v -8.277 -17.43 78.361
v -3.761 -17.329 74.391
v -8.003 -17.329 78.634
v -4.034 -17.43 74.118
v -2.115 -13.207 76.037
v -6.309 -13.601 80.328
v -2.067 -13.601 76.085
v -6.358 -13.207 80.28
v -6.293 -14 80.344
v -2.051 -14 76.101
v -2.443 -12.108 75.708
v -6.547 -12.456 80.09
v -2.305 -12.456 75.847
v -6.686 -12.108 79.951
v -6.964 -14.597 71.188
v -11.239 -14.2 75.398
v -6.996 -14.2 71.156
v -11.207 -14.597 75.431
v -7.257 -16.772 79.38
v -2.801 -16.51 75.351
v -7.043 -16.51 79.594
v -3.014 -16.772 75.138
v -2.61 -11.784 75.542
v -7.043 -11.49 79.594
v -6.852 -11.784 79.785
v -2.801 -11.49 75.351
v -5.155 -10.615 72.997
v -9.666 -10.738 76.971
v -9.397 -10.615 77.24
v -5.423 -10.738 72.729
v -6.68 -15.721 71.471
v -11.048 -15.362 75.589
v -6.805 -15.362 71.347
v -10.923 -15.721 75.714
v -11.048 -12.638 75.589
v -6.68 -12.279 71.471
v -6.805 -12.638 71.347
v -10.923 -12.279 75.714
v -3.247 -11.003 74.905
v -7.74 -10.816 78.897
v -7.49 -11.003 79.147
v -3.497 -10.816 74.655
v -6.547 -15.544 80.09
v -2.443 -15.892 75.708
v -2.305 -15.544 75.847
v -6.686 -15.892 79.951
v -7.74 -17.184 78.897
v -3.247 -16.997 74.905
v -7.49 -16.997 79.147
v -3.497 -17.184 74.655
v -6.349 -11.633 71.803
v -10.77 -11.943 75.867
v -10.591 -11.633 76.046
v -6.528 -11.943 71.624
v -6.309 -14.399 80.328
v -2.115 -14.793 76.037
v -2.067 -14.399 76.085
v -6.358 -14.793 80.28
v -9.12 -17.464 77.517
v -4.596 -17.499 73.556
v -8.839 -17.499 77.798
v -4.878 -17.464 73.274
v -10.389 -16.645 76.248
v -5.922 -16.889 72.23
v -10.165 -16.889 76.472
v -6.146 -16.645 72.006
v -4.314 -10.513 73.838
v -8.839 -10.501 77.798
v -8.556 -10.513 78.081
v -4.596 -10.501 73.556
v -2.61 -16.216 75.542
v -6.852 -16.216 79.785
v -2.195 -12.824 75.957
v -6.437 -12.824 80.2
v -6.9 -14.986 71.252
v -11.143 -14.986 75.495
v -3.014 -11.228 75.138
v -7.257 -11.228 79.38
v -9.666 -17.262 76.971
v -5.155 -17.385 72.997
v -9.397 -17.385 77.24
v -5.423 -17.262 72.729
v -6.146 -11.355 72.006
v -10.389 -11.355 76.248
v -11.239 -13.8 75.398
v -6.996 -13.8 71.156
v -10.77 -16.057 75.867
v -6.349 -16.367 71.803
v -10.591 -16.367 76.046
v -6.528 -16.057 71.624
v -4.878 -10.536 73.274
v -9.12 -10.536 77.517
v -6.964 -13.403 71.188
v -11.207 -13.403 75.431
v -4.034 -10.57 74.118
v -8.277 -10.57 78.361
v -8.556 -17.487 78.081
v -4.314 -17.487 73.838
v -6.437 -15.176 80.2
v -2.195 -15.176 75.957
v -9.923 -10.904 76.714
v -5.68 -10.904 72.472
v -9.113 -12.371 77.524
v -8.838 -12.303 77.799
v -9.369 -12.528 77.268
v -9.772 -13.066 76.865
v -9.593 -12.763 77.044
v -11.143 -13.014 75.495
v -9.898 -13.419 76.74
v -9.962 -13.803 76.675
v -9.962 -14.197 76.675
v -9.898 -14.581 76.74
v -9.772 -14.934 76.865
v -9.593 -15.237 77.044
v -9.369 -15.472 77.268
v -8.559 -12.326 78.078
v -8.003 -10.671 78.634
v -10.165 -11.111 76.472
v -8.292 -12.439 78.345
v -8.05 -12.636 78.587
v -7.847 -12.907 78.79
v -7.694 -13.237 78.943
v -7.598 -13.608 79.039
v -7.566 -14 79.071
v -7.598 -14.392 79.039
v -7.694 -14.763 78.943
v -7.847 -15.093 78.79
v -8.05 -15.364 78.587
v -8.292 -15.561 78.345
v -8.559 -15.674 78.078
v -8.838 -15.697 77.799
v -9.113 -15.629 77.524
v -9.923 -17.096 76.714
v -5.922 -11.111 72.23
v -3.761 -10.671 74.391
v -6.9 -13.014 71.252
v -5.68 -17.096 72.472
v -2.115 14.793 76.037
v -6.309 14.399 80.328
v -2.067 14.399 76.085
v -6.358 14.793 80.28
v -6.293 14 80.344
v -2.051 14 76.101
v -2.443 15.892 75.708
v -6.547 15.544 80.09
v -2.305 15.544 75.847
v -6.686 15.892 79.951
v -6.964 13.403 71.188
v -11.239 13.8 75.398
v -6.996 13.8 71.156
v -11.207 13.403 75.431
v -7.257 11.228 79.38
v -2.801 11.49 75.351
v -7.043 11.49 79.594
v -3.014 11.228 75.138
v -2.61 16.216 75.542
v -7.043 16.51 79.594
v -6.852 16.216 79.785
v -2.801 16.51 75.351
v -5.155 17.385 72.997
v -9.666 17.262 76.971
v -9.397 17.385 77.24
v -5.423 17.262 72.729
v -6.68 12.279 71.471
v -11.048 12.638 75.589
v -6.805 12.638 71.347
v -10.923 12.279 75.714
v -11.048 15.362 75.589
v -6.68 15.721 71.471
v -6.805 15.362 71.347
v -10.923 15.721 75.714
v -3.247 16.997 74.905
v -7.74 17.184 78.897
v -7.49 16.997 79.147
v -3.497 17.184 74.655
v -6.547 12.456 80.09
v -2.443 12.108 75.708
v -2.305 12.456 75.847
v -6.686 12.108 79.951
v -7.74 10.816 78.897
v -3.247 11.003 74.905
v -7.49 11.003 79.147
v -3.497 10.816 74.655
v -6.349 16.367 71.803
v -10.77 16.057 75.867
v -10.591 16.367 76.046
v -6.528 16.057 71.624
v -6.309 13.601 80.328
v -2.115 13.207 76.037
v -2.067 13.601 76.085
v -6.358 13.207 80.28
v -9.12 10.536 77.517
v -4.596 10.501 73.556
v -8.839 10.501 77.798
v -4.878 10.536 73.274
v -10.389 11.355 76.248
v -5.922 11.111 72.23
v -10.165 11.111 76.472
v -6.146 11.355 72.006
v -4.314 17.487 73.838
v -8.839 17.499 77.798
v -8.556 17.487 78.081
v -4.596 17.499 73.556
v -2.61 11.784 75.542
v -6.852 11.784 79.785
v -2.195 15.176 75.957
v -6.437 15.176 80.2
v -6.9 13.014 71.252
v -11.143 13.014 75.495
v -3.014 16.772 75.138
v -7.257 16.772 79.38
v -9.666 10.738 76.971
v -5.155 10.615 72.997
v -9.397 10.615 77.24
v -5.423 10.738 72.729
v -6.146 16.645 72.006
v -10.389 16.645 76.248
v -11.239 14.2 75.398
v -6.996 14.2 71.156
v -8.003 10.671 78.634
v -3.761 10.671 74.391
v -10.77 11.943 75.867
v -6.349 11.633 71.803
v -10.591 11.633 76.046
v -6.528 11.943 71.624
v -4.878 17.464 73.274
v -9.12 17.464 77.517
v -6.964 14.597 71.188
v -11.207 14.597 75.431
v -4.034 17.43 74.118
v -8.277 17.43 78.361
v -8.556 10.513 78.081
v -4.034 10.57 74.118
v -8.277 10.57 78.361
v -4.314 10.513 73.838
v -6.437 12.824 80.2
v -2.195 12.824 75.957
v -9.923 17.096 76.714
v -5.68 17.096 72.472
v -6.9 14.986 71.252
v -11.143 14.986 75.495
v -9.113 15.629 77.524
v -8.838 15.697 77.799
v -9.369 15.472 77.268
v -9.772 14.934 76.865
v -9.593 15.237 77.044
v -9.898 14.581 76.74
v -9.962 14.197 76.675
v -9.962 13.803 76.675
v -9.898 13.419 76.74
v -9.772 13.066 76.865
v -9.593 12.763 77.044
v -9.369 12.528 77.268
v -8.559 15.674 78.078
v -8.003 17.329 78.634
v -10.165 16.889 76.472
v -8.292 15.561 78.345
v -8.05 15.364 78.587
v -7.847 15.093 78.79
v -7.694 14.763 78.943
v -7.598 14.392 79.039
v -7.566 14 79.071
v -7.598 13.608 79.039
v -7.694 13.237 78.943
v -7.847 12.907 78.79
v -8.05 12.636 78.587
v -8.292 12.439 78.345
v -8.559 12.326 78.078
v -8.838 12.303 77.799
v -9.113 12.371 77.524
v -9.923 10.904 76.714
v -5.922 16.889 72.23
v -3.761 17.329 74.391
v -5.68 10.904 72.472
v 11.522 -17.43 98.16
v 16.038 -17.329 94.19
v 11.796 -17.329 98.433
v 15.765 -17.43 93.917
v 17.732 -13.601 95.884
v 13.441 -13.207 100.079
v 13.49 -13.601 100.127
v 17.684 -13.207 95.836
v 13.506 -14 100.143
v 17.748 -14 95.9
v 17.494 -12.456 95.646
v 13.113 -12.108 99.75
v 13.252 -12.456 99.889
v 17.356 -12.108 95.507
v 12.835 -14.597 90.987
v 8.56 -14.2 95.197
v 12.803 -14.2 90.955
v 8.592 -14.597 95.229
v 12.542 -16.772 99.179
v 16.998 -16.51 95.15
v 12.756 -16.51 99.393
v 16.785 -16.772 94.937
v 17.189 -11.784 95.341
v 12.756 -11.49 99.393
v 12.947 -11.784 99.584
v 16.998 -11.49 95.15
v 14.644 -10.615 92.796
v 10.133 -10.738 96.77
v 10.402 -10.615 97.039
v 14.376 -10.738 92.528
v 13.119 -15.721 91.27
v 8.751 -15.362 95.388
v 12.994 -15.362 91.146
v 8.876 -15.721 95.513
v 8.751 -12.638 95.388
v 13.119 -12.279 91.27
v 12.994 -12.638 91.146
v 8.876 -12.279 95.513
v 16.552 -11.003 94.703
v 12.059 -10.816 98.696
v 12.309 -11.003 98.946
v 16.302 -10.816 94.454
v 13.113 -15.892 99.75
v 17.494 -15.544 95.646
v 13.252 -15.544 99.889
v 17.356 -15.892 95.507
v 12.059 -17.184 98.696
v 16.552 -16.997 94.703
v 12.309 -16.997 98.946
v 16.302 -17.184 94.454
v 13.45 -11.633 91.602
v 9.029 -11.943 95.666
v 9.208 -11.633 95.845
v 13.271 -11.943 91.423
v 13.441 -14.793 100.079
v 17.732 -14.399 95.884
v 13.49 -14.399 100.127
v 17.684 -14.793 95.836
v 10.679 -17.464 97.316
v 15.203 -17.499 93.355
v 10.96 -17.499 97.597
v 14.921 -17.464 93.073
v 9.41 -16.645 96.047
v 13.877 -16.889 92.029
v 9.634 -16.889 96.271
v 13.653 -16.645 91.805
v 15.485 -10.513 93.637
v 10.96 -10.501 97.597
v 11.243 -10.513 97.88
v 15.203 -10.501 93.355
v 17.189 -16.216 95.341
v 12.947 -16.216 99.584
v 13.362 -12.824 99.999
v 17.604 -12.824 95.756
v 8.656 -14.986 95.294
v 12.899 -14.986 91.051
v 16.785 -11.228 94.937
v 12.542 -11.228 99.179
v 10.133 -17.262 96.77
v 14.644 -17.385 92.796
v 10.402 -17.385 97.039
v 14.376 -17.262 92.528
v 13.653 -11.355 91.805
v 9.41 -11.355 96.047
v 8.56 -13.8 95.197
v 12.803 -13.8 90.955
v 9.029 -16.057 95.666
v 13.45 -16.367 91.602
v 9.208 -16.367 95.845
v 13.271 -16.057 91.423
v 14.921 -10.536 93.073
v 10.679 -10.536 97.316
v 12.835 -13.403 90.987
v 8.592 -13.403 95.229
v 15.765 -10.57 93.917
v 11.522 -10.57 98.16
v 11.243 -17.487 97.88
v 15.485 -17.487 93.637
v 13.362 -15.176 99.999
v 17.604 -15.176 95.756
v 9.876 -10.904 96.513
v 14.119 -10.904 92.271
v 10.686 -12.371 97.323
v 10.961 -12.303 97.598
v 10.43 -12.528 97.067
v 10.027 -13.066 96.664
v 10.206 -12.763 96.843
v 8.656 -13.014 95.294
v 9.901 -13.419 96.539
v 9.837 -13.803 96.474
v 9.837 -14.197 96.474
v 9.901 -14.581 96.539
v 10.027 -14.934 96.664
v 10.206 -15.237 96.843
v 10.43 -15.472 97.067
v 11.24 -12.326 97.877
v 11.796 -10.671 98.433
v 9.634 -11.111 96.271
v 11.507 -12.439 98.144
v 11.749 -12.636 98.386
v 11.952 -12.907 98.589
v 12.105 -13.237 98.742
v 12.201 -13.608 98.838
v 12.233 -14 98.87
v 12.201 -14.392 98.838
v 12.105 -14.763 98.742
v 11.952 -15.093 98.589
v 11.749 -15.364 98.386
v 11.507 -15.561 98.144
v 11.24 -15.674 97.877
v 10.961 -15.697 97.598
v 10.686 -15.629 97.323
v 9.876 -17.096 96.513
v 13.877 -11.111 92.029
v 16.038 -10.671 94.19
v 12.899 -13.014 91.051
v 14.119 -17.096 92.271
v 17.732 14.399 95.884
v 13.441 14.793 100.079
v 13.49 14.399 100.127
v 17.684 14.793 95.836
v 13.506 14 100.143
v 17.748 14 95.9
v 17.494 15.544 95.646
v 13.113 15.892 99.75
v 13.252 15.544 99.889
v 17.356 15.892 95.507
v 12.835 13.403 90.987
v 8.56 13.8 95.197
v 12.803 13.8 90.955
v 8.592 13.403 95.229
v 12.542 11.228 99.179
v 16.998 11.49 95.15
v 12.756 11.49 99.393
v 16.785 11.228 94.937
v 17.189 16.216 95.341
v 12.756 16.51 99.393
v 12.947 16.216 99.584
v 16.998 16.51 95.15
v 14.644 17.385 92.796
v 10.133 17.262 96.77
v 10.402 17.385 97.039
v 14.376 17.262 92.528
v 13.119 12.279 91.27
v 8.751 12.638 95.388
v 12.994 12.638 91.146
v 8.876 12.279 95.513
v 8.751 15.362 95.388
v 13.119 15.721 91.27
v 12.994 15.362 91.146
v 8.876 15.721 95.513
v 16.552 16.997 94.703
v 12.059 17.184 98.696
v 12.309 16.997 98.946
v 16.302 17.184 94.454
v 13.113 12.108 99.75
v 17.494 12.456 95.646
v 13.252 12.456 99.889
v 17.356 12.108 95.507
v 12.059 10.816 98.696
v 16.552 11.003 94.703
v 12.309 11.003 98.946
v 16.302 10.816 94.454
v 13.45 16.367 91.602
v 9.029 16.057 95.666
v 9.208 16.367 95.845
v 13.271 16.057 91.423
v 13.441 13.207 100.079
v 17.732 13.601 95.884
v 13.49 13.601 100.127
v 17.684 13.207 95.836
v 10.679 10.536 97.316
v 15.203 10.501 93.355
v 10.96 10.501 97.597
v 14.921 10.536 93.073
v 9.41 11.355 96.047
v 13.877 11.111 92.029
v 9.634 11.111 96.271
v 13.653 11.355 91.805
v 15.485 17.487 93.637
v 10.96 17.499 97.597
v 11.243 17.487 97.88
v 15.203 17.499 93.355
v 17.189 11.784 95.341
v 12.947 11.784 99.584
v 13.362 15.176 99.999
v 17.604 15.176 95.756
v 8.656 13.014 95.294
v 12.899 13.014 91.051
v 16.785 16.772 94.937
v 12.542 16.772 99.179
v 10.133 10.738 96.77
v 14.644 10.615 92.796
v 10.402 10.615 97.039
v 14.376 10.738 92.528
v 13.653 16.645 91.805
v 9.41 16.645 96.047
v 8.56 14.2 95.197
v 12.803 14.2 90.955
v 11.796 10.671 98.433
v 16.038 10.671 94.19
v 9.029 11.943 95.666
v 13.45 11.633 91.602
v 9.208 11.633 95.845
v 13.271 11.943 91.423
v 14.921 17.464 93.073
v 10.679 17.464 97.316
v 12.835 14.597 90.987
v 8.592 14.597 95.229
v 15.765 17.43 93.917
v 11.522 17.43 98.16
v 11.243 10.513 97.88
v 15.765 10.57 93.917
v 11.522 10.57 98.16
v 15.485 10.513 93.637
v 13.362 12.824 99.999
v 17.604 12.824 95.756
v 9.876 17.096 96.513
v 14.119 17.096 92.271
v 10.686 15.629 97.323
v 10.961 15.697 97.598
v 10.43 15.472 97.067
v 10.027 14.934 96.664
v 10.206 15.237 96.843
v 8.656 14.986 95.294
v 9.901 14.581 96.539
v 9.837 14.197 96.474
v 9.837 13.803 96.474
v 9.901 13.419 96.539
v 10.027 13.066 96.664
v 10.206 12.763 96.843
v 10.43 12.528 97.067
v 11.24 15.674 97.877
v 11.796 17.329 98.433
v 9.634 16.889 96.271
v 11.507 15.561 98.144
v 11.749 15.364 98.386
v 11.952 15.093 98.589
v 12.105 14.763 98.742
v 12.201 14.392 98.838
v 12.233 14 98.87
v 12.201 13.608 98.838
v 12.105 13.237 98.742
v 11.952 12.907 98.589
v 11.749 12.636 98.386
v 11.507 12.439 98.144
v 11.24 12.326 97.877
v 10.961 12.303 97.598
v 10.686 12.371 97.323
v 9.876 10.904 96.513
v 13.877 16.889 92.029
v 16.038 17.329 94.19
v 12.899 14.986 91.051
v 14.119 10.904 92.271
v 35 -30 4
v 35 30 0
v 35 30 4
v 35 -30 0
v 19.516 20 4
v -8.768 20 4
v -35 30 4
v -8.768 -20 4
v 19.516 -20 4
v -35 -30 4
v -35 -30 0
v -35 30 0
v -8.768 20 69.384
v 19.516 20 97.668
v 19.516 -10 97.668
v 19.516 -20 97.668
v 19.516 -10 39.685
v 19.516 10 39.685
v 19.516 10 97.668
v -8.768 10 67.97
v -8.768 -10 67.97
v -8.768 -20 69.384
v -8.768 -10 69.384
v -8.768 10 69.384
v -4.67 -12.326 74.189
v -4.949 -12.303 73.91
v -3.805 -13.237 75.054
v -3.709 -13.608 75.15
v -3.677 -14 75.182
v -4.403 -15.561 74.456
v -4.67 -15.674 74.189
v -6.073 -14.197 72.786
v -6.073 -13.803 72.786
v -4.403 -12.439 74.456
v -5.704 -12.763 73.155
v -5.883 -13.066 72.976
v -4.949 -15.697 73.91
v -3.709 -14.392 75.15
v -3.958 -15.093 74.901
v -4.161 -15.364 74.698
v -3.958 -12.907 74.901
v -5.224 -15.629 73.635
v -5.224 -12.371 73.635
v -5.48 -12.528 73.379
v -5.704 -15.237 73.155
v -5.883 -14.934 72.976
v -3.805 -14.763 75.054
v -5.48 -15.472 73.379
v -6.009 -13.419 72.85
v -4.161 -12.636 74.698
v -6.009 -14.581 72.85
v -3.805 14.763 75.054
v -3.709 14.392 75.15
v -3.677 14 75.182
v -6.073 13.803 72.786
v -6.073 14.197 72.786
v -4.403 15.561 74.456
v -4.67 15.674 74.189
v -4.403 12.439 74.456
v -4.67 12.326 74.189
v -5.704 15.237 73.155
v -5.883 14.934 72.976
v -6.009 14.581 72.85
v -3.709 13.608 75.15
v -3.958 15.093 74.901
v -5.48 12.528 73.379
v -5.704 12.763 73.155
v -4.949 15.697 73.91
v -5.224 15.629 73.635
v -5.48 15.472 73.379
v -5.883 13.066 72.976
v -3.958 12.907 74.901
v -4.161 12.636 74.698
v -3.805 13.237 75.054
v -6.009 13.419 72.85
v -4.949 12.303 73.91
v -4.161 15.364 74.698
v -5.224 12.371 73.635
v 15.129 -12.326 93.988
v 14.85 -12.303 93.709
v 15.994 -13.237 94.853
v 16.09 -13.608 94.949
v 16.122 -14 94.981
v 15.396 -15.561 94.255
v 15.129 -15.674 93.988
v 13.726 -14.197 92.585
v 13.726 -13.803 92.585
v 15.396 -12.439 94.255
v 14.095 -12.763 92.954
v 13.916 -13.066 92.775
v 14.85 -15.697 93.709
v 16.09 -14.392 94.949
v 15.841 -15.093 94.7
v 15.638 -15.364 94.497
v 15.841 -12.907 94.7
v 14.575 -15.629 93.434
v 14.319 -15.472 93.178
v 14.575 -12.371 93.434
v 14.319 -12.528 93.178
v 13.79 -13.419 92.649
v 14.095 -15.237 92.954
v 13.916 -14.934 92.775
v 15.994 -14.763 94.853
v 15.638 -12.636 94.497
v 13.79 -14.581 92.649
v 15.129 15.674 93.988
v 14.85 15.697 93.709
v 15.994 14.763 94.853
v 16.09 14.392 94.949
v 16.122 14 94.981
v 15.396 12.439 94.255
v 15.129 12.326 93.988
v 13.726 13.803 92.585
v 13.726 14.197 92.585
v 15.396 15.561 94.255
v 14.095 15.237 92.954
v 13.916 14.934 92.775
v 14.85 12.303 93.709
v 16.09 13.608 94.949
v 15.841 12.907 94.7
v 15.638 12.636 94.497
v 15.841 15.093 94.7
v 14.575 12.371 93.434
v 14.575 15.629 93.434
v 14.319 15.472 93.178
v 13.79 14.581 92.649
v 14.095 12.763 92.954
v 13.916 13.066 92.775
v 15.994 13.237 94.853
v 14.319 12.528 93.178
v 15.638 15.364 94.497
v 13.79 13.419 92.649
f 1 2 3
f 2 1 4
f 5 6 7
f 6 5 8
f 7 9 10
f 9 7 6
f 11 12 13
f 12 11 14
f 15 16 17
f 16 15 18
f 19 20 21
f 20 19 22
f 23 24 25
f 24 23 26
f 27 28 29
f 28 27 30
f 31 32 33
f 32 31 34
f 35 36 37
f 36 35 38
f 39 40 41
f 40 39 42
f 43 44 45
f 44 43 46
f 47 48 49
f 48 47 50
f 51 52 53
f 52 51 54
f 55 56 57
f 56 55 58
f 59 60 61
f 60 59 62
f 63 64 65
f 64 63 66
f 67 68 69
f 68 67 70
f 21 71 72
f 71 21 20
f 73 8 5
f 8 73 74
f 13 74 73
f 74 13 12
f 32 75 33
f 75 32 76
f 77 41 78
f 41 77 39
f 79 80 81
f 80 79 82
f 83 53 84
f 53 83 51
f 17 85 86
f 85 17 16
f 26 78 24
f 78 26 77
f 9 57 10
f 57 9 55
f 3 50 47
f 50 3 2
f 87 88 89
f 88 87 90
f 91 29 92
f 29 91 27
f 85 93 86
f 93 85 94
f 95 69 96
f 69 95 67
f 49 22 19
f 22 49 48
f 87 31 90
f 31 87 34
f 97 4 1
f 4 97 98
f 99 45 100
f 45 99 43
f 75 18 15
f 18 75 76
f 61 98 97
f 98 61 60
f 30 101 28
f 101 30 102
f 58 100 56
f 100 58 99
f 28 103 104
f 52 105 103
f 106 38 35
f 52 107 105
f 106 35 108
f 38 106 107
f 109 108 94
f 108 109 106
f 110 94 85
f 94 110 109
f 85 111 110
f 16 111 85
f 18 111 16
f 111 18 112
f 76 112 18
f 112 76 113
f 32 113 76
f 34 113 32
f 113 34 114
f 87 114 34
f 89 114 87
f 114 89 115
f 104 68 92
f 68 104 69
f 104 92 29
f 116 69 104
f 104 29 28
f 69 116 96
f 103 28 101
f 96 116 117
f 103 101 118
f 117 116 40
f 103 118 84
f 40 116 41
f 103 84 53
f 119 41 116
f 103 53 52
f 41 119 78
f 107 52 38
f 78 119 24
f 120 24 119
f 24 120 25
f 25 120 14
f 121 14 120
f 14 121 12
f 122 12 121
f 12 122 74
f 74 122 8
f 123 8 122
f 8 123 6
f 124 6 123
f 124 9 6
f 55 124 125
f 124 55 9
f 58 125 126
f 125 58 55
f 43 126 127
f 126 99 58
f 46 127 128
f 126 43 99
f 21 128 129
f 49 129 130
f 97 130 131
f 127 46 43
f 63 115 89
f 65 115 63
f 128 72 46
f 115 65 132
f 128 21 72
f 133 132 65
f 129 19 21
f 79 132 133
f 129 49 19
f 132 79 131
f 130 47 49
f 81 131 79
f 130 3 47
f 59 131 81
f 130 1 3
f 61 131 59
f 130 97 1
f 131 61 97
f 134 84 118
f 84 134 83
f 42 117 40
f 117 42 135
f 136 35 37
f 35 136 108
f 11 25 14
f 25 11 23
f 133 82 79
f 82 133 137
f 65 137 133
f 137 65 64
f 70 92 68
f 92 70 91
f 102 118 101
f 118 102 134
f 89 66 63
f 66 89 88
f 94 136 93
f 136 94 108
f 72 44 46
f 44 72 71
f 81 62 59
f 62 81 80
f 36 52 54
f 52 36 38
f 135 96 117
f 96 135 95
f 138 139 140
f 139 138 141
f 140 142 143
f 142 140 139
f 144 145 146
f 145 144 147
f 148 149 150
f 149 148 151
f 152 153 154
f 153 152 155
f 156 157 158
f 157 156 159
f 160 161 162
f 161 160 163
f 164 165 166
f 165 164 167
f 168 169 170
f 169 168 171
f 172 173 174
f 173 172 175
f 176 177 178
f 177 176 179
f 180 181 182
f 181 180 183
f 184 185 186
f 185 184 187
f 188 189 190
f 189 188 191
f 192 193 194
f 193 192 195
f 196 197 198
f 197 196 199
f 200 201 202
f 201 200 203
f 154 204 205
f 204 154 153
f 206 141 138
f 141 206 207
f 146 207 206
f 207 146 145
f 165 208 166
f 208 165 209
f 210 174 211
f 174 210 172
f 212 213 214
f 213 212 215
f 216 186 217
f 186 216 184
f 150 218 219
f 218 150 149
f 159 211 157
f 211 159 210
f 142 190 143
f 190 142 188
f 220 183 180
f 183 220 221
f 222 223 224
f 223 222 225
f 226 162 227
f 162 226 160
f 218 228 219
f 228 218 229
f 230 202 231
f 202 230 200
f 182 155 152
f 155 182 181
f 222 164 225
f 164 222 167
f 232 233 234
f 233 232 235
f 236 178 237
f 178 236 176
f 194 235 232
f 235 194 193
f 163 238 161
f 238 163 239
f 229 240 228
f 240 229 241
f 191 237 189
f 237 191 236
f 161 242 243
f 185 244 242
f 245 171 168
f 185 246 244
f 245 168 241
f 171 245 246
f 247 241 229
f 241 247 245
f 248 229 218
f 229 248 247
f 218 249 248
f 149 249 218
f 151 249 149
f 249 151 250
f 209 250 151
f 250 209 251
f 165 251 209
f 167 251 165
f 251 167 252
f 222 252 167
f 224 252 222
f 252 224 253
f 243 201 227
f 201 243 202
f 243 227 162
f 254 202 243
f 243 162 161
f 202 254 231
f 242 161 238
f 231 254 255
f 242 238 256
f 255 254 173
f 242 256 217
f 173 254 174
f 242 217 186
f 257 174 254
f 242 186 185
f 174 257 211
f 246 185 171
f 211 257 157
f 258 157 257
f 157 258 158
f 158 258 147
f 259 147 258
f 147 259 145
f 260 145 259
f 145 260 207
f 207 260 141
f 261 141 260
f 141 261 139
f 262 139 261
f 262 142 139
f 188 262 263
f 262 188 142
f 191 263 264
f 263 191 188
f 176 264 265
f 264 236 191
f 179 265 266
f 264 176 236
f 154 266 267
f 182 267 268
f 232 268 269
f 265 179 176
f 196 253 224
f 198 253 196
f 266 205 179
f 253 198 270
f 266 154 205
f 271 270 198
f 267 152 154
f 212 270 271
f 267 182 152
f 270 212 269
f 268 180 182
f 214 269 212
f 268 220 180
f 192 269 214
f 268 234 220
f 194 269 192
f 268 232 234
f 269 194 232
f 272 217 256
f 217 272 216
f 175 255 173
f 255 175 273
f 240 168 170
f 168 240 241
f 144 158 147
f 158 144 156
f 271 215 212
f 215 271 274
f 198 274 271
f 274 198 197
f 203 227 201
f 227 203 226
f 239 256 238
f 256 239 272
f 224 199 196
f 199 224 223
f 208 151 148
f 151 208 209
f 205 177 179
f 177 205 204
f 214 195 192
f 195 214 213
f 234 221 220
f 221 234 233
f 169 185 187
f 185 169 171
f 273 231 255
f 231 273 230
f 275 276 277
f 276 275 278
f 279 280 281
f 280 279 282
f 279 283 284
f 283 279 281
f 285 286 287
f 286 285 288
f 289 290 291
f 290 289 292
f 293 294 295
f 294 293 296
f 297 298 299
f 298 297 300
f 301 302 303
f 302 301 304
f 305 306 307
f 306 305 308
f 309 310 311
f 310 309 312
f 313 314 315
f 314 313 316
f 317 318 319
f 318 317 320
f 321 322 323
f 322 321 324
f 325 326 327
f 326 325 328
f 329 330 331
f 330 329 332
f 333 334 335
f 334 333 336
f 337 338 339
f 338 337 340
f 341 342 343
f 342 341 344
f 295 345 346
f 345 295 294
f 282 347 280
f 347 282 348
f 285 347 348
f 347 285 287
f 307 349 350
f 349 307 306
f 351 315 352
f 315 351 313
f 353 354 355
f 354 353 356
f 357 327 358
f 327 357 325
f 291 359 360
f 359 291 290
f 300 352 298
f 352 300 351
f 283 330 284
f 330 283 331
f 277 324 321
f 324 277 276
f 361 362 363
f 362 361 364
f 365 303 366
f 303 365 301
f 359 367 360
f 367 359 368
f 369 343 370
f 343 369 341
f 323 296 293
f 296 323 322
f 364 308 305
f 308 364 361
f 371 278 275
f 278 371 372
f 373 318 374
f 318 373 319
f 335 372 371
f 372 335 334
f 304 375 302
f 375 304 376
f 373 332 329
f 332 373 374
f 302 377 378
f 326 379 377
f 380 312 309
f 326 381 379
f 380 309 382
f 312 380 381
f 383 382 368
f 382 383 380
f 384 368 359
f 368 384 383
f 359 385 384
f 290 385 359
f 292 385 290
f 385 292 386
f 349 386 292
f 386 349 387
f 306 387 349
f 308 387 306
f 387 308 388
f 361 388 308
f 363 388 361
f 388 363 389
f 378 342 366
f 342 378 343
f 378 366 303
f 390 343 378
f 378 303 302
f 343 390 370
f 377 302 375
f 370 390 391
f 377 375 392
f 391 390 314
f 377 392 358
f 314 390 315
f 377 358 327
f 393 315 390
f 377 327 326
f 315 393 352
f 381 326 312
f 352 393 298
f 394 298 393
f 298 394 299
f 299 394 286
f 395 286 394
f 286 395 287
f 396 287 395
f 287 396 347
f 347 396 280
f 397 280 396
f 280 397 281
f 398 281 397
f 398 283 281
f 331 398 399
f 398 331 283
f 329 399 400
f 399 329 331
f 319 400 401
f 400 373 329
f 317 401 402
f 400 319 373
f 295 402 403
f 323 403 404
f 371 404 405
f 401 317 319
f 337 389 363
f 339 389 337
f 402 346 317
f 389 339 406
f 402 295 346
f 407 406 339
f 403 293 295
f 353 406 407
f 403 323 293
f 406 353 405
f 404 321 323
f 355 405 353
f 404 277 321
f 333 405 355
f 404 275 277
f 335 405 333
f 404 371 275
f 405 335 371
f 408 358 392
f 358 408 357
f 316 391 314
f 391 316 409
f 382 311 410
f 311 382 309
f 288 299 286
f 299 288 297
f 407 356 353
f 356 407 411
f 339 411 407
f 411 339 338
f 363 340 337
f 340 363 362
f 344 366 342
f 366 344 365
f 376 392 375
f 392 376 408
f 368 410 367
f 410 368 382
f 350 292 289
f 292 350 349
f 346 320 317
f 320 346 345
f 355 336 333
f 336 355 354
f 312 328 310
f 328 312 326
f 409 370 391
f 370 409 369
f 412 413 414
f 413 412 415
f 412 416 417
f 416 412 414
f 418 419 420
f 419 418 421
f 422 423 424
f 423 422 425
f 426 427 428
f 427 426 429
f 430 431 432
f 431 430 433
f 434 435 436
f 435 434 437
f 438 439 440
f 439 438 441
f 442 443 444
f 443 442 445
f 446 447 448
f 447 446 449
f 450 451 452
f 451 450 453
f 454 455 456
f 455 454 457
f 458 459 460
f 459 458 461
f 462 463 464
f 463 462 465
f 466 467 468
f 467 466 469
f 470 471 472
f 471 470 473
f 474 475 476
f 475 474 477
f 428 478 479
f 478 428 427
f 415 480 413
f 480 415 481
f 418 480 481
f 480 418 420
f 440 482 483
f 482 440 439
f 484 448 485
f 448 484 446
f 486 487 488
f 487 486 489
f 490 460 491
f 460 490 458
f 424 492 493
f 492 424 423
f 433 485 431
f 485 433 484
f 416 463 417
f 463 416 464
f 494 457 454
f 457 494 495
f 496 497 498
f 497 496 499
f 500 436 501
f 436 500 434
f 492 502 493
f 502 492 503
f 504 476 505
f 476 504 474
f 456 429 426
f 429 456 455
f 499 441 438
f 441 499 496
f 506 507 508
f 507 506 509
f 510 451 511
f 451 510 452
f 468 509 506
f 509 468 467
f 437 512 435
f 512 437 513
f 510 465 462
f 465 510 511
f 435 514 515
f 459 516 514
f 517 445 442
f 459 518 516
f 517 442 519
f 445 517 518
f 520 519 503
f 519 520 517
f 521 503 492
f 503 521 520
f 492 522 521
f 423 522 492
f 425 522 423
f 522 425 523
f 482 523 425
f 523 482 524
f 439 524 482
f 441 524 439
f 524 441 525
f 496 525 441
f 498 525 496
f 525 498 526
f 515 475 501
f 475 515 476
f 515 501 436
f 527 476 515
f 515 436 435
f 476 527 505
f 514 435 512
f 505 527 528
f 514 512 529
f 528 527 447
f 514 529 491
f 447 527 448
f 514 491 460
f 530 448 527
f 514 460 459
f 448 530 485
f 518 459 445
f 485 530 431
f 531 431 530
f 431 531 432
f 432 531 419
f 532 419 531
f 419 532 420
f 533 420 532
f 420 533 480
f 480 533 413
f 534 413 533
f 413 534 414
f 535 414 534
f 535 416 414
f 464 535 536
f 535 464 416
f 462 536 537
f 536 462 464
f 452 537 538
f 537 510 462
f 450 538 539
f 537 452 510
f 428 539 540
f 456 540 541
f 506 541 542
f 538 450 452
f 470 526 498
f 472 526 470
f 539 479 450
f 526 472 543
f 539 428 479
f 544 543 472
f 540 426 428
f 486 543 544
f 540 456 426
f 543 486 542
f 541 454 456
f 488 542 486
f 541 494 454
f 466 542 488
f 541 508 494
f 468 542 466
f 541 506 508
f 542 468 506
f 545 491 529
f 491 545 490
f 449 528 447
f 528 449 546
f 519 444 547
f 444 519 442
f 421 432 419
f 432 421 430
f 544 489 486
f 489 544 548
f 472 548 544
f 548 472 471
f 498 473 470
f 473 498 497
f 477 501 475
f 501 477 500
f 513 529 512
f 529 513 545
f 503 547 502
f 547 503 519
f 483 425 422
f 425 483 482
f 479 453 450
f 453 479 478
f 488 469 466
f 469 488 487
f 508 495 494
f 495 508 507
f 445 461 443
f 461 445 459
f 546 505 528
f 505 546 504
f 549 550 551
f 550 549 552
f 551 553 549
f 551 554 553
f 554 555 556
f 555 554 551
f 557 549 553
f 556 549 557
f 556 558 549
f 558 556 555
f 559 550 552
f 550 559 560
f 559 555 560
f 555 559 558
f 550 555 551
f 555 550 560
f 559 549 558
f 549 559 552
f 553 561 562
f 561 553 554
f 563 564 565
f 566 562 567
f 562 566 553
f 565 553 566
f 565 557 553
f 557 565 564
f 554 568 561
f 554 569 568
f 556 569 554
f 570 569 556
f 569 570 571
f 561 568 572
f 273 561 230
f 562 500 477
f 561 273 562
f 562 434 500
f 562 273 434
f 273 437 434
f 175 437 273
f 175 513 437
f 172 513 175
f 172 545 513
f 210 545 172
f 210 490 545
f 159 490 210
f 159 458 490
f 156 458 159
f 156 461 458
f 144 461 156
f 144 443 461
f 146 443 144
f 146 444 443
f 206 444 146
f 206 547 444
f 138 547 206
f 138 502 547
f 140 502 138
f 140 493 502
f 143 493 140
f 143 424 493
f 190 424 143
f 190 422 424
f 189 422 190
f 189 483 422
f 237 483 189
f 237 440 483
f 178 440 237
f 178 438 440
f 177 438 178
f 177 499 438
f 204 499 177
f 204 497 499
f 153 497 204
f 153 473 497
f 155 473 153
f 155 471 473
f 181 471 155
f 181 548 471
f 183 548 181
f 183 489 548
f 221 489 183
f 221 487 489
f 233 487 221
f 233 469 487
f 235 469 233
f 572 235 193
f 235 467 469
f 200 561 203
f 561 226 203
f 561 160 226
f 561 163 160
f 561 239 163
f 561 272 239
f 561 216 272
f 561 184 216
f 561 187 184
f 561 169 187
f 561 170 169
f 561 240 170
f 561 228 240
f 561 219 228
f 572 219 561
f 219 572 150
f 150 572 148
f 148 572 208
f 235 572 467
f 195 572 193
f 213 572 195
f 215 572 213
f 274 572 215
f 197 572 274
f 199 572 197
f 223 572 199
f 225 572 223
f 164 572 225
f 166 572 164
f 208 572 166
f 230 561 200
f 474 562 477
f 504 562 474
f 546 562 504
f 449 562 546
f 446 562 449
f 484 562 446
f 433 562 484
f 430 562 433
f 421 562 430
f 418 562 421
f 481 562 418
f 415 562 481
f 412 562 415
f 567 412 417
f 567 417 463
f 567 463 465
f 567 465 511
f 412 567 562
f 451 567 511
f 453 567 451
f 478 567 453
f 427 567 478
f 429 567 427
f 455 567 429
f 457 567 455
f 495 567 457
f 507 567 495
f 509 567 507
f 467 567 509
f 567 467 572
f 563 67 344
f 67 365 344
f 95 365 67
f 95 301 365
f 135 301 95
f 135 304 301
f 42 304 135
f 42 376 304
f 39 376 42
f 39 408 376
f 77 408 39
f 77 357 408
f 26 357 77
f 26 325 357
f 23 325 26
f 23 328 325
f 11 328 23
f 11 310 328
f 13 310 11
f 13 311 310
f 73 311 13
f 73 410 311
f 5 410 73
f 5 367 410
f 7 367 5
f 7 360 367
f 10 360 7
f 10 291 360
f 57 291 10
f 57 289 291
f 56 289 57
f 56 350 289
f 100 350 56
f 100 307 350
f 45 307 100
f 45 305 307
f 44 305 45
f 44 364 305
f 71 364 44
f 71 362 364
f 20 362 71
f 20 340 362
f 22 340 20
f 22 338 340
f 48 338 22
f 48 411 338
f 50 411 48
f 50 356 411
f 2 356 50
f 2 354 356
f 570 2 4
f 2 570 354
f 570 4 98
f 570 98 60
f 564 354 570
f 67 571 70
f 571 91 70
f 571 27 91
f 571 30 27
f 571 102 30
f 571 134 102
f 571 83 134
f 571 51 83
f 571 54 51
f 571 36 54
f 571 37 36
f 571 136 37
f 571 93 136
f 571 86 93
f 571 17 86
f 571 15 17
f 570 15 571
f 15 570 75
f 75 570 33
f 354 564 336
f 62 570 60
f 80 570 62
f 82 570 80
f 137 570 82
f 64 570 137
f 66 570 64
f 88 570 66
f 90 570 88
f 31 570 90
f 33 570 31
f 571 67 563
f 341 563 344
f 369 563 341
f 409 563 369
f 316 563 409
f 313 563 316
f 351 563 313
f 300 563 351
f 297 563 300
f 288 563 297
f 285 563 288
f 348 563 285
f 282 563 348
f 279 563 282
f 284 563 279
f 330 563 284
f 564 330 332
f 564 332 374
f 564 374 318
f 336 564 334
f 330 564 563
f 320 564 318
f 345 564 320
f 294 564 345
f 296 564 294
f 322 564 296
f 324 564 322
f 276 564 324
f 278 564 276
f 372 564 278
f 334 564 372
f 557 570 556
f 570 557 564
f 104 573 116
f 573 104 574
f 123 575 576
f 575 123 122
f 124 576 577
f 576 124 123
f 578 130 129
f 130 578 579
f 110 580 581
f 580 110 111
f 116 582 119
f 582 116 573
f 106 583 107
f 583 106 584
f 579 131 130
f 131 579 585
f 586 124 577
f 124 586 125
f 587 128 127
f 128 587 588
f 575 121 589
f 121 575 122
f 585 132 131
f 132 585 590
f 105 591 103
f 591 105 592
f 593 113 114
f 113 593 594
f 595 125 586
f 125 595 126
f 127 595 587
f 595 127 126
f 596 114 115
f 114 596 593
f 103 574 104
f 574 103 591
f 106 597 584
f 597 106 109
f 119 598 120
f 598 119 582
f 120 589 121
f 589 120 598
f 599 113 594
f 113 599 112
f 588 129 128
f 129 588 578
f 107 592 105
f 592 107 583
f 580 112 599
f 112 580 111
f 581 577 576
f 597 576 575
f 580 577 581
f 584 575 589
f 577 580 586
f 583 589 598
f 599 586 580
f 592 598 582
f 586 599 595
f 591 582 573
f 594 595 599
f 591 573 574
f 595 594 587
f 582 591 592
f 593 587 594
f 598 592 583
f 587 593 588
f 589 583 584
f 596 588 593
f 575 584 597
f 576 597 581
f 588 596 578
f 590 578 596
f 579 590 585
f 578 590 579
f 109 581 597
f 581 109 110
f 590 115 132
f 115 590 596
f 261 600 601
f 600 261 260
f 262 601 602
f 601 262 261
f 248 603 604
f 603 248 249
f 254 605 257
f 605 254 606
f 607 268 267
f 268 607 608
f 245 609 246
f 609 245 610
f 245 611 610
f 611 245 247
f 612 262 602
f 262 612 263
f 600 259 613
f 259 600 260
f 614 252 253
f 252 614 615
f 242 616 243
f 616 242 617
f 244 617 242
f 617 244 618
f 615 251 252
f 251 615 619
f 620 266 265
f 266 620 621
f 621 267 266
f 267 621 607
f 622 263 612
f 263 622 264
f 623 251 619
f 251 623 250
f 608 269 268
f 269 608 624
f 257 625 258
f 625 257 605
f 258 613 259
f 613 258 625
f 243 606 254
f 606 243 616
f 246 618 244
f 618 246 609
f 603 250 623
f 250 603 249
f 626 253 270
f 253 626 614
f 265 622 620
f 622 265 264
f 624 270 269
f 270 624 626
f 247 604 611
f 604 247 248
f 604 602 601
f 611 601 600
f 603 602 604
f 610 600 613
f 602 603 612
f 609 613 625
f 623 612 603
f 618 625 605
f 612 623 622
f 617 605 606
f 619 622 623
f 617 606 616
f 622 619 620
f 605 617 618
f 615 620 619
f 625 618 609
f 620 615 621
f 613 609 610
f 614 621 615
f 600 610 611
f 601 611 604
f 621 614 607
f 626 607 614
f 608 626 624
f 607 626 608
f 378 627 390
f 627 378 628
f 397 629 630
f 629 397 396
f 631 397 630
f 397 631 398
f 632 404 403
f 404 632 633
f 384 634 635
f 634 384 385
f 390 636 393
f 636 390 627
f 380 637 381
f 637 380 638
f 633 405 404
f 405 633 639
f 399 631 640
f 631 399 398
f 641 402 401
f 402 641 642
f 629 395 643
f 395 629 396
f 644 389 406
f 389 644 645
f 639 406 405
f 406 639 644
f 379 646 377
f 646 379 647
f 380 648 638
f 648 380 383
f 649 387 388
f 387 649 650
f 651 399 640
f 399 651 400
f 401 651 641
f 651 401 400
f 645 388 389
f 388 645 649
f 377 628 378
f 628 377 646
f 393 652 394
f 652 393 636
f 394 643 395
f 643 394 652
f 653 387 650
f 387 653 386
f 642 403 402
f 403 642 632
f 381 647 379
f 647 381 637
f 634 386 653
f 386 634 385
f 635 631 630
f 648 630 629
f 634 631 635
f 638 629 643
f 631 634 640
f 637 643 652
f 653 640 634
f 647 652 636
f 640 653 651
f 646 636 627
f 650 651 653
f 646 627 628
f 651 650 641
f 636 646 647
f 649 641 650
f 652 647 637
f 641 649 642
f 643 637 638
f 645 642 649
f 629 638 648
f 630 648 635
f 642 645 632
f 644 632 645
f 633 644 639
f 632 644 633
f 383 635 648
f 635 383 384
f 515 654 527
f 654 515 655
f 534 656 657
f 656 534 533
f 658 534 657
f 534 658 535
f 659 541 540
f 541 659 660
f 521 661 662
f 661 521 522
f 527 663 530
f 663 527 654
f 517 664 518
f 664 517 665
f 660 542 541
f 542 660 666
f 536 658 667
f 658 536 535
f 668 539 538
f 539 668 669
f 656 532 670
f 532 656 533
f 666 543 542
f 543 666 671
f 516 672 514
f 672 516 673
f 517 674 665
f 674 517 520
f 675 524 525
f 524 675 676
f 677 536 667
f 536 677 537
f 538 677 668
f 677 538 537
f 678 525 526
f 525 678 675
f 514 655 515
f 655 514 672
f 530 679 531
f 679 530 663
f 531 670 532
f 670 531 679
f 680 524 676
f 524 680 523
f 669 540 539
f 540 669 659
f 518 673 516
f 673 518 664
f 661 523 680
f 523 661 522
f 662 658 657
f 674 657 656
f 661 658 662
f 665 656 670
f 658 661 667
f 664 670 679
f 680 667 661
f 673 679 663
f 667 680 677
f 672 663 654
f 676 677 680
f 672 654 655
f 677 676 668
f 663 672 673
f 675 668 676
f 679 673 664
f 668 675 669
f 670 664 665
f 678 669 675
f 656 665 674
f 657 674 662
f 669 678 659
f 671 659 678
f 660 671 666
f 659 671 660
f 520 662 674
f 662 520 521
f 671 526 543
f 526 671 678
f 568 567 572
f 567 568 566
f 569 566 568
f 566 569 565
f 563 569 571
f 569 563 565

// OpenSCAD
// file: BOSL2/std.scad
// Minimal BOSL2 compatibility shim for bundled gallery models.
// It implements only the helpers used by the imported OpenSCAD projects.

CENTER = [0, 0, 0];
BOTTOM = [0, 0, -1];
TOP = [0, 0, 1];
LEFT = [-1, 0, 0];
RIGHT = [1, 0, 0];
FRONT = [0, -1, 0];
BACK = [0, 1, 0];

module up(z=0) {
    translate([0, 0, z]) children();
}

module down(z=0) {
    translate([0, 0, -z]) children();
}

module attach(anchor=CENTER) {
    children();
}

module cuboid(size=[1, 1, 1], anchor=CENTER) {
    center = anchor == CENTER;
    translate(center ? [0, 0, 0] : [0, 0, size[2] / 2])
        cube(size, center=true);
    children();
}

module xcyl(h=1, r=1, anchor=CENTER) {
    center = anchor == CENTER;
    translate(center ? [0, 0, 0] : [h / 2, 0, 0])
        rotate([0, 90, 0])
            cylinder(h=h, r=r, center=true);
}
// main file
// Temporary desk stand for the 32 x 32 mm OV9281 USB camera board: the board faces up and
// toward -X at 45°, its centre 3.5" above the table. Four M2 screws into heat-set inserts.
// Print base down; no supports.
include <BOSL2/std.scad>
$fa = 2; $fs = 0.4;

// --- Placement ---
board_center_h = 88.9;   // height of the board's front-face centre above the table (3.5")
tilt           = 45;     // board angle from vertical; the camera looks up at this angle

// --- Camera board (from its drawing) ---
board      = 32;         // board is board x board mm
hole_pitch = 28;         // M2 holes on a hole_pitch square
pcb_t      = 1.6;        // board thickness

// --- Inserts (same as 3dprints/laundry-sensor: M2*H4, 3.4 mm holes from its insert-test) ---
insert_d   = 3.4;        // insert hole diameter
insert_l   = 4;          // insert length
hole_extra = 1.5;        // hole depth past the insert for the screw tip
standoff_d = 7;          // standoff diameter
standoff_h = 6;          // gap behind the board for its back-side parts and cable plug

// --- USB cable ---
// The cable plugs into a 5-pin 1.25 mm connector on the back of the board, at one edge next to
// the 5V/DM/DP/G/G pads, and leaves straight out the back. A slot between the two standoff pairs,
// the length of the face, runs straight back through the tower and out its rear face.
slot_w = 20;             // slot width across the face; the standoffs sit on the walls either side

// --- Body ---
face_len = 40;           // length of the sloped face along the slope (board + margin)
width    = 40;           // tower width (Y)
base     = [70, 60, 4];  // base plate X, Y, thickness

n  = [-sin(tilt), 0, cos(tilt)];   // face normal: up and toward -X
u  = [ cos(tilt), 0, sin(tilt)];   // up the slope, toward +X
// Board front face is standoff_h + pcb_t out along n from the face centre.
C  = [0, 0, board_center_h] - (standoff_h + pcb_t) * n;
A  = C - face_len / 2 * u;         // low end of the face
B  = C + face_len / 2 * u;         // high end of the face

echo(face_center = C, face_low_z = A[2], face_high_z = B[2], overall_h = B[2]);
echo(board_front_center = C + (standoff_h + pcb_t) * n);

// Profile in XZ, extruded across Y.
module tower()
    rotate([90, 0, 0]) linear_extrude(width, center = true)
        polygon([[A[0], 0], [B[0], 0], [B[0], B[2]], [A[0], A[2]]]);

// Local frame on the face: z along the normal, x up the slope.
module on_face() translate(C) rotate([0, -tilt, 0]) children();

difference() {
    union() {
        cuboid(base, rounding = 3, edges = "Z", anchor = BOTTOM);
        tower();
        on_face() for (x = [-1, 1], y = [-1, 1])
            translate([x * hole_pitch / 2, y * hole_pitch / 2, -1]) cylinder(d = standoff_d, h = standoff_h + 1);
    }
    on_face() for (x = [-1, 1], y = [-1, 1])
        translate([x * hole_pitch / 2, y * hole_pitch / 2, standoff_h - insert_l - hole_extra])
            cylinder(d = insert_d, h = insert_l + hole_extra + 0.01);
    // Cable slot: along the whole face, straight back (along -n) until it leaves the tower.
    on_face() translate([-(face_len / 2 + 1), -slot_w / 2, -100]) cube([face_len + 2, slot_w, 100 + standoff_h]);
}
echo(slot_w = slot_w, standoff_inner_gap = hole_pitch - standoff_d, side_wall = (width - slot_w) / 2);
